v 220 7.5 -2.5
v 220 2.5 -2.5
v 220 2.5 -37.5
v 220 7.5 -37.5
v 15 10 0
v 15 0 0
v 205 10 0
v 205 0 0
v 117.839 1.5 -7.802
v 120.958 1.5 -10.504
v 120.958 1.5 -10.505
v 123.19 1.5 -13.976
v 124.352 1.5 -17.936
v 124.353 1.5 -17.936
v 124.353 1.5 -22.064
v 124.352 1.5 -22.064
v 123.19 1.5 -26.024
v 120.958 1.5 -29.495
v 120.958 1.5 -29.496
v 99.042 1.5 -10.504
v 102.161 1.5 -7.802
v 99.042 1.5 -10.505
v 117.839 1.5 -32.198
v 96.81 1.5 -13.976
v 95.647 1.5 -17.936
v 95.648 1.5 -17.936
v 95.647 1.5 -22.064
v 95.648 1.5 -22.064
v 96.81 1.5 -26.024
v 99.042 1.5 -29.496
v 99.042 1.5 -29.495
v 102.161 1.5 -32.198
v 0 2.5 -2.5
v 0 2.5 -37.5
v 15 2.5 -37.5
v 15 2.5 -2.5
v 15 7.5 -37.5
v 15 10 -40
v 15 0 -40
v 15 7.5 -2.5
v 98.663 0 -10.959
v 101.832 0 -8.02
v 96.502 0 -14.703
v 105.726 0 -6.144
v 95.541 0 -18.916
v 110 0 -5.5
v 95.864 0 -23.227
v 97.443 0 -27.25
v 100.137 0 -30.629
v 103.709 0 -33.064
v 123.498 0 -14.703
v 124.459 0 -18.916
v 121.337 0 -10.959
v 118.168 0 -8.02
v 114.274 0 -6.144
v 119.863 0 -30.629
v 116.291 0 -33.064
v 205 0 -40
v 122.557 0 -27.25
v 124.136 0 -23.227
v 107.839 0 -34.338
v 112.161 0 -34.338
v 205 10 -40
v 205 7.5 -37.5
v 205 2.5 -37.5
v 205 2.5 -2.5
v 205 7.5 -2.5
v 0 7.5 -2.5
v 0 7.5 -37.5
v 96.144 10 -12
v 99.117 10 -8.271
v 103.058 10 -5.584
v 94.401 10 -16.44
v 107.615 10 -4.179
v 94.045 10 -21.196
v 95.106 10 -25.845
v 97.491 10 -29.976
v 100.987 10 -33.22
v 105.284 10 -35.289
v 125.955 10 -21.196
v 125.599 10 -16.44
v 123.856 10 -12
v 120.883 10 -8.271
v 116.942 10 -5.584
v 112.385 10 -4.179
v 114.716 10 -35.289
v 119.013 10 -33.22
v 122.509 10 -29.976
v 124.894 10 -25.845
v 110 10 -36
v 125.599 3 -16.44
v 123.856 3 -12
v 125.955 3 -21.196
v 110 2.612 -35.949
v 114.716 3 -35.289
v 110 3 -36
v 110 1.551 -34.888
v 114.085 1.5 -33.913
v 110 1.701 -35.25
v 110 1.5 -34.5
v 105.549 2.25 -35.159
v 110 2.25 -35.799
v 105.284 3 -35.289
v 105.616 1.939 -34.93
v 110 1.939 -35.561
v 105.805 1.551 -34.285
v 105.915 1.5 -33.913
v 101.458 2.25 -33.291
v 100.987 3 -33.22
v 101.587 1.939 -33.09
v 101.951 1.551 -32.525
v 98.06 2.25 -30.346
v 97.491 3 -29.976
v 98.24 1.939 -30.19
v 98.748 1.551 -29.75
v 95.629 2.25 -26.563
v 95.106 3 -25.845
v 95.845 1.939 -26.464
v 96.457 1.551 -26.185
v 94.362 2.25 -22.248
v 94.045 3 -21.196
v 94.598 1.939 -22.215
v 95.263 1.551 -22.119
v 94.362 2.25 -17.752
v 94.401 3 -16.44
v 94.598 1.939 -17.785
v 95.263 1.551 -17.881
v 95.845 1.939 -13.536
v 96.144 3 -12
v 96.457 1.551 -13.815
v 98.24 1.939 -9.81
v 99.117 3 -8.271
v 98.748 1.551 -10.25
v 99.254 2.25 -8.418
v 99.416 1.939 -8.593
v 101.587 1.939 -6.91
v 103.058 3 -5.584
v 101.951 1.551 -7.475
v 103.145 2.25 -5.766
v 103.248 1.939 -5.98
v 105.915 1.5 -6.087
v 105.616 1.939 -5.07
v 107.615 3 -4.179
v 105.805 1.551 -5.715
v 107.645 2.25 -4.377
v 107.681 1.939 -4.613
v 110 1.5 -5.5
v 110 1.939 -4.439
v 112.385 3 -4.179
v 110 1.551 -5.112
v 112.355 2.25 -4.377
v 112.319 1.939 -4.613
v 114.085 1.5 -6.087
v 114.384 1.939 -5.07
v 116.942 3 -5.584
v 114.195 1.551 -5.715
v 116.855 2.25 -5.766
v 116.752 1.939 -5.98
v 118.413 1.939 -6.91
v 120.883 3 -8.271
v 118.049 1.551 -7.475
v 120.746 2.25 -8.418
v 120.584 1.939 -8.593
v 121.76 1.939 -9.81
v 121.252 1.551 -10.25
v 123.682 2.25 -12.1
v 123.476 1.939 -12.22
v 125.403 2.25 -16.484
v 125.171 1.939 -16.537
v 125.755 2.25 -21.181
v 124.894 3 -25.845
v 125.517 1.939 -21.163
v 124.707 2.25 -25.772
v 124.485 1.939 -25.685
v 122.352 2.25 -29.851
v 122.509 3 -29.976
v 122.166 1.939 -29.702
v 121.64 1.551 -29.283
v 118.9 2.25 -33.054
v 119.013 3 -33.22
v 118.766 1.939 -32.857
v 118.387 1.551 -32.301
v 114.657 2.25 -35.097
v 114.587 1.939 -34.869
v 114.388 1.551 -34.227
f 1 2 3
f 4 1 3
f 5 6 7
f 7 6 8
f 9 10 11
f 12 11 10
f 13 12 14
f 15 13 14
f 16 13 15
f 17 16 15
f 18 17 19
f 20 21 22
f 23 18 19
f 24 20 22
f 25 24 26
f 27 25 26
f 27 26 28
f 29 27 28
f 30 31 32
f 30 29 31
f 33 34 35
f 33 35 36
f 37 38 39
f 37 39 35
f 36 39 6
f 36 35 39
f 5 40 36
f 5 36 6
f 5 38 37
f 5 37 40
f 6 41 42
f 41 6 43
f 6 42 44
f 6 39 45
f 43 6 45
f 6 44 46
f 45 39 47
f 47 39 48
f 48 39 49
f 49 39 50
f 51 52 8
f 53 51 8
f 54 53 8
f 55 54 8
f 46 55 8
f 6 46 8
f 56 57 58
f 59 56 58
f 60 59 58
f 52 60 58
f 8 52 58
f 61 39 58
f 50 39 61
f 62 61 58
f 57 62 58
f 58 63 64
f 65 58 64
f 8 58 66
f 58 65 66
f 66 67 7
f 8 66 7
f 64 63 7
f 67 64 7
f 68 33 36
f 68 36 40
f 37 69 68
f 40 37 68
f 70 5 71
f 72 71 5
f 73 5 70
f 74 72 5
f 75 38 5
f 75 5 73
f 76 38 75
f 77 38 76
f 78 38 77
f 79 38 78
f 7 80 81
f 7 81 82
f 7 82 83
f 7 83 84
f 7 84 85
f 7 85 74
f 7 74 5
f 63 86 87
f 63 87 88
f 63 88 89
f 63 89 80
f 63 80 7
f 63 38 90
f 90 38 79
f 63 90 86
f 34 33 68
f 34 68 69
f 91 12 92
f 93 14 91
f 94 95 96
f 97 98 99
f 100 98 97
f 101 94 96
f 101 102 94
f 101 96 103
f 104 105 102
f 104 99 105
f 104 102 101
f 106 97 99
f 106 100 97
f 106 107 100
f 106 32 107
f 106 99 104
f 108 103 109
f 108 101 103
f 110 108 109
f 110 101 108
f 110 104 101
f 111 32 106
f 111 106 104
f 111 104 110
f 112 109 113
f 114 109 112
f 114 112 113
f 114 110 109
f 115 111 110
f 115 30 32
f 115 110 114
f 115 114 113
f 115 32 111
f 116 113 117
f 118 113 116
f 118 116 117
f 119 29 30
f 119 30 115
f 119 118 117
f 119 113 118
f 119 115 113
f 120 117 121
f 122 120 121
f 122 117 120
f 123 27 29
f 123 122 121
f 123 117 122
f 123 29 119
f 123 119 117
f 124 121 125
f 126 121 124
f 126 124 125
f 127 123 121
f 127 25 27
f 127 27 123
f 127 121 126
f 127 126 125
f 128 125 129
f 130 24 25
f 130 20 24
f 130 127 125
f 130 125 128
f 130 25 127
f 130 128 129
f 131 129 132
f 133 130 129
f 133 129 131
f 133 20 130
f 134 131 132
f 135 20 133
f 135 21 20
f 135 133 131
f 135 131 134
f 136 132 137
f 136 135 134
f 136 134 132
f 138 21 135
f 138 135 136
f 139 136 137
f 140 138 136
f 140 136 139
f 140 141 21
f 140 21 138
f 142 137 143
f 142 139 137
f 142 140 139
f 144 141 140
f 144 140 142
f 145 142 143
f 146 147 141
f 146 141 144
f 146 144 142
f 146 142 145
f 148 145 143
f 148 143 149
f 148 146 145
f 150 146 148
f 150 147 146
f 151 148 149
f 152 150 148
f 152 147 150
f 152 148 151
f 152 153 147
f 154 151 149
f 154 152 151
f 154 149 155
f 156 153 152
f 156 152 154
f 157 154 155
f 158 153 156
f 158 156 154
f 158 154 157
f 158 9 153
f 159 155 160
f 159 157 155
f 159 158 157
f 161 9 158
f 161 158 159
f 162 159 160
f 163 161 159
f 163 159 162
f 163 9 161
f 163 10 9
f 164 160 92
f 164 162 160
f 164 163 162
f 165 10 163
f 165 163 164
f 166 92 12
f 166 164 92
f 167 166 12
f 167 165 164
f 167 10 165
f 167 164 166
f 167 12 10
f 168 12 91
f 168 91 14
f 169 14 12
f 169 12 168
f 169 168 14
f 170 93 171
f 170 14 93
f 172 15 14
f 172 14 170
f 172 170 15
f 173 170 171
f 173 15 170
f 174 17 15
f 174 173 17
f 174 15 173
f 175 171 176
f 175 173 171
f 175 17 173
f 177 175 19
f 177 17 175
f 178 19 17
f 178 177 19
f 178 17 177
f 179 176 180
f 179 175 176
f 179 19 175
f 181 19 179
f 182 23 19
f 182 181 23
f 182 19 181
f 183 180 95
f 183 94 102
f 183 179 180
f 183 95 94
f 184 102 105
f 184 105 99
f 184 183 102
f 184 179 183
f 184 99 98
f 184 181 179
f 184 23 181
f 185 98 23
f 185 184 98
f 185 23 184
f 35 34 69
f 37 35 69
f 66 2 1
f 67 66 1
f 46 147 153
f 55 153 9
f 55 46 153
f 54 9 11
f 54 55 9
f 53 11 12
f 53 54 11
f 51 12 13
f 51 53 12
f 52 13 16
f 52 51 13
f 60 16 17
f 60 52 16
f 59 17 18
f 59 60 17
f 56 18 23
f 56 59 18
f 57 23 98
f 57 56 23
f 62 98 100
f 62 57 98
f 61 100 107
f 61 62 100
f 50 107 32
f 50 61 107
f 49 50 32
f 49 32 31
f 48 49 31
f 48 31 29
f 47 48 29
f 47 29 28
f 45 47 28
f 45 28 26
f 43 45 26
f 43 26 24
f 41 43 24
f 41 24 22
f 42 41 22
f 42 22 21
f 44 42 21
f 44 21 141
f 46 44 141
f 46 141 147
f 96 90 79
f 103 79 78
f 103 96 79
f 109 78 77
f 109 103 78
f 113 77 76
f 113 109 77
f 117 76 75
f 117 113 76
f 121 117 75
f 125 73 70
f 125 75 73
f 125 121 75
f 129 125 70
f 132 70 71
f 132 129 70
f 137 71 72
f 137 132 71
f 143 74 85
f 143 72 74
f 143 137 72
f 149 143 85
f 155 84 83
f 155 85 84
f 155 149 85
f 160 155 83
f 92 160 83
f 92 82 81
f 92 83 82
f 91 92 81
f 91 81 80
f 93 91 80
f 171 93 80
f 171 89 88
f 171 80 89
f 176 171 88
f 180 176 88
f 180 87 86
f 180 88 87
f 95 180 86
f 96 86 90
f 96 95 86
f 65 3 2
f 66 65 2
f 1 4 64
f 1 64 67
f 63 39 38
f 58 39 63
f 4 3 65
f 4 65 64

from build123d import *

# Parameters (mm, degrees)
ESBO_O1_W                  = 220
ESBO_O1_H                  = 40
RESSALTO_EXTRUS_O1_DEPTH   = 10
ESBO_O2_W                  = 40
ESBO_O2_H                  = 10
ESBO_O2_W_2                = 35
ESBO_O2_H_2                = 5
CORTE_EXTRUS_O1_DEPTH      = 15
CORTE_EXTRUS_O2_DEPTH      = 224.830292856
CORTE_EXTRUS_O2_DEPTH_BACK = 224.830292856
ESBO_O3_R                  = 14.5
CORTE_EXTRUS_O3_DEPTH      = 224.830292856
CORTE_EXTRUS_O3_DEPTH_BACK = 8.5
ESBO_O4_R                  = 16
ESBO_O4_R_2                = 14.5
FILETE1_R                  = 1.5


with BuildPart() as part:
    # Esboço1 → Ressalto-extrusão1 (new body)
    with BuildSketch(Plane(origin=(0, 0, 0), x_dir=(1, 0, 0), z_dir=(0, 1, 0))):
        with Locations((110, 20)):
            Rectangle(ESBO_O1_W, ESBO_O1_H)
    extrude(amount=RESSALTO_EXTRUS_O1_DEPTH)

    # Esboço2 → Corte-extrusão1 (cut)
    with BuildSketch(Plane.ZY):
        with Locations((-20, 5)):
            Rectangle(ESBO_O2_W, ESBO_O2_H)
        with Locations((-20, 5)):
            Rectangle(ESBO_O2_W_2, ESBO_O2_H_2, mode=Mode.SUBTRACT)
    corte_extrus_o1 = extrude(amount=-CORTE_EXTRUS_O1_DEPTH, mode=Mode.SUBTRACT)

    # Espelhar1: Corte-extrusão1 across plane
    add(corte_extrus_o1.mirror(Plane.ZY.offset(-110)), mode=Mode.SUBTRACT)

    # Esboço3 → Corte-extrusão2 (cut, two sides: drawn at the far end of the back side and taken through both)
    with BuildSketch(Plane(origin=(0, 0, 0), x_dir=(1, 0, 0), z_dir=(0, 1, 0)).offset(-CORTE_EXTRUS_O2_DEPTH_BACK)):
        with Locations(Location((110, 20, 0), (0, 0, 270))):
            Circle(ESBO_O3_R)
    extrude(amount=CORTE_EXTRUS_O2_DEPTH + CORTE_EXTRUS_O2_DEPTH_BACK, mode=Mode.SUBTRACT)

    # Esboço4 → Corte-extrusão3 (cut, two sides: drawn at the far end of the back side and taken through both)
    with BuildSketch(Plane(origin=(0, 10, 0), x_dir=(1, 0, 0), z_dir=(0, 1, 0)).offset(-CORTE_EXTRUS_O3_DEPTH_BACK)):
        with Locations(Location((110, 20, 0), (0, 0, 90))):
            Circle(ESBO_O4_R)
        with Locations(Location((110, 20, 0), (0, 0, 270))):
            Circle(ESBO_O4_R_2, mode=Mode.SUBTRACT)
    extrude(amount=CORTE_EXTRUS_O3_DEPTH + CORTE_EXTRUS_O3_DEPTH_BACK, mode=Mode.SUBTRACT)

    # Filete1
    filete1_edges = [part.edges().sort_by_distance(p)[0] for p in [
        (110, 1.5, -4),
    ]]
    fillet(filete1_edges, radius=FILETE1_R - 0.0001)  # a hair under: the kernel refuses the full size


solid = part.part
